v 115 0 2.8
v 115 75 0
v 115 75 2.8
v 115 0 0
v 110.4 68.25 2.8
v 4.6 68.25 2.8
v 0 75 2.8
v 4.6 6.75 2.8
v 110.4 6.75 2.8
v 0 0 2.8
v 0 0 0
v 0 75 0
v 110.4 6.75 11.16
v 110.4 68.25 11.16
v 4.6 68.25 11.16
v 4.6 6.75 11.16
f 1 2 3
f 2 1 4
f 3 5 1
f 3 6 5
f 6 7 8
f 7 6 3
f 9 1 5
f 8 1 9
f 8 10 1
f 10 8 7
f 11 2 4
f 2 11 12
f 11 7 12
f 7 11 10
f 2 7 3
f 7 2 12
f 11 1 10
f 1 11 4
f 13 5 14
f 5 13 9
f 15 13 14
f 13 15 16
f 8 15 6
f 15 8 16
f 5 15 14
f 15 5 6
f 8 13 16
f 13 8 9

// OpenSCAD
union() {
	translate(v = [57.5, 37.5, 1.4]) {
		cube(center = true, size = [115.0, 75.0, 2.8]);
	}
	translate(v = [57.5, 37.5, 6.98]) {
		cube(center = true, size = [105.8, 61.5, 8.36]);
	}
}
